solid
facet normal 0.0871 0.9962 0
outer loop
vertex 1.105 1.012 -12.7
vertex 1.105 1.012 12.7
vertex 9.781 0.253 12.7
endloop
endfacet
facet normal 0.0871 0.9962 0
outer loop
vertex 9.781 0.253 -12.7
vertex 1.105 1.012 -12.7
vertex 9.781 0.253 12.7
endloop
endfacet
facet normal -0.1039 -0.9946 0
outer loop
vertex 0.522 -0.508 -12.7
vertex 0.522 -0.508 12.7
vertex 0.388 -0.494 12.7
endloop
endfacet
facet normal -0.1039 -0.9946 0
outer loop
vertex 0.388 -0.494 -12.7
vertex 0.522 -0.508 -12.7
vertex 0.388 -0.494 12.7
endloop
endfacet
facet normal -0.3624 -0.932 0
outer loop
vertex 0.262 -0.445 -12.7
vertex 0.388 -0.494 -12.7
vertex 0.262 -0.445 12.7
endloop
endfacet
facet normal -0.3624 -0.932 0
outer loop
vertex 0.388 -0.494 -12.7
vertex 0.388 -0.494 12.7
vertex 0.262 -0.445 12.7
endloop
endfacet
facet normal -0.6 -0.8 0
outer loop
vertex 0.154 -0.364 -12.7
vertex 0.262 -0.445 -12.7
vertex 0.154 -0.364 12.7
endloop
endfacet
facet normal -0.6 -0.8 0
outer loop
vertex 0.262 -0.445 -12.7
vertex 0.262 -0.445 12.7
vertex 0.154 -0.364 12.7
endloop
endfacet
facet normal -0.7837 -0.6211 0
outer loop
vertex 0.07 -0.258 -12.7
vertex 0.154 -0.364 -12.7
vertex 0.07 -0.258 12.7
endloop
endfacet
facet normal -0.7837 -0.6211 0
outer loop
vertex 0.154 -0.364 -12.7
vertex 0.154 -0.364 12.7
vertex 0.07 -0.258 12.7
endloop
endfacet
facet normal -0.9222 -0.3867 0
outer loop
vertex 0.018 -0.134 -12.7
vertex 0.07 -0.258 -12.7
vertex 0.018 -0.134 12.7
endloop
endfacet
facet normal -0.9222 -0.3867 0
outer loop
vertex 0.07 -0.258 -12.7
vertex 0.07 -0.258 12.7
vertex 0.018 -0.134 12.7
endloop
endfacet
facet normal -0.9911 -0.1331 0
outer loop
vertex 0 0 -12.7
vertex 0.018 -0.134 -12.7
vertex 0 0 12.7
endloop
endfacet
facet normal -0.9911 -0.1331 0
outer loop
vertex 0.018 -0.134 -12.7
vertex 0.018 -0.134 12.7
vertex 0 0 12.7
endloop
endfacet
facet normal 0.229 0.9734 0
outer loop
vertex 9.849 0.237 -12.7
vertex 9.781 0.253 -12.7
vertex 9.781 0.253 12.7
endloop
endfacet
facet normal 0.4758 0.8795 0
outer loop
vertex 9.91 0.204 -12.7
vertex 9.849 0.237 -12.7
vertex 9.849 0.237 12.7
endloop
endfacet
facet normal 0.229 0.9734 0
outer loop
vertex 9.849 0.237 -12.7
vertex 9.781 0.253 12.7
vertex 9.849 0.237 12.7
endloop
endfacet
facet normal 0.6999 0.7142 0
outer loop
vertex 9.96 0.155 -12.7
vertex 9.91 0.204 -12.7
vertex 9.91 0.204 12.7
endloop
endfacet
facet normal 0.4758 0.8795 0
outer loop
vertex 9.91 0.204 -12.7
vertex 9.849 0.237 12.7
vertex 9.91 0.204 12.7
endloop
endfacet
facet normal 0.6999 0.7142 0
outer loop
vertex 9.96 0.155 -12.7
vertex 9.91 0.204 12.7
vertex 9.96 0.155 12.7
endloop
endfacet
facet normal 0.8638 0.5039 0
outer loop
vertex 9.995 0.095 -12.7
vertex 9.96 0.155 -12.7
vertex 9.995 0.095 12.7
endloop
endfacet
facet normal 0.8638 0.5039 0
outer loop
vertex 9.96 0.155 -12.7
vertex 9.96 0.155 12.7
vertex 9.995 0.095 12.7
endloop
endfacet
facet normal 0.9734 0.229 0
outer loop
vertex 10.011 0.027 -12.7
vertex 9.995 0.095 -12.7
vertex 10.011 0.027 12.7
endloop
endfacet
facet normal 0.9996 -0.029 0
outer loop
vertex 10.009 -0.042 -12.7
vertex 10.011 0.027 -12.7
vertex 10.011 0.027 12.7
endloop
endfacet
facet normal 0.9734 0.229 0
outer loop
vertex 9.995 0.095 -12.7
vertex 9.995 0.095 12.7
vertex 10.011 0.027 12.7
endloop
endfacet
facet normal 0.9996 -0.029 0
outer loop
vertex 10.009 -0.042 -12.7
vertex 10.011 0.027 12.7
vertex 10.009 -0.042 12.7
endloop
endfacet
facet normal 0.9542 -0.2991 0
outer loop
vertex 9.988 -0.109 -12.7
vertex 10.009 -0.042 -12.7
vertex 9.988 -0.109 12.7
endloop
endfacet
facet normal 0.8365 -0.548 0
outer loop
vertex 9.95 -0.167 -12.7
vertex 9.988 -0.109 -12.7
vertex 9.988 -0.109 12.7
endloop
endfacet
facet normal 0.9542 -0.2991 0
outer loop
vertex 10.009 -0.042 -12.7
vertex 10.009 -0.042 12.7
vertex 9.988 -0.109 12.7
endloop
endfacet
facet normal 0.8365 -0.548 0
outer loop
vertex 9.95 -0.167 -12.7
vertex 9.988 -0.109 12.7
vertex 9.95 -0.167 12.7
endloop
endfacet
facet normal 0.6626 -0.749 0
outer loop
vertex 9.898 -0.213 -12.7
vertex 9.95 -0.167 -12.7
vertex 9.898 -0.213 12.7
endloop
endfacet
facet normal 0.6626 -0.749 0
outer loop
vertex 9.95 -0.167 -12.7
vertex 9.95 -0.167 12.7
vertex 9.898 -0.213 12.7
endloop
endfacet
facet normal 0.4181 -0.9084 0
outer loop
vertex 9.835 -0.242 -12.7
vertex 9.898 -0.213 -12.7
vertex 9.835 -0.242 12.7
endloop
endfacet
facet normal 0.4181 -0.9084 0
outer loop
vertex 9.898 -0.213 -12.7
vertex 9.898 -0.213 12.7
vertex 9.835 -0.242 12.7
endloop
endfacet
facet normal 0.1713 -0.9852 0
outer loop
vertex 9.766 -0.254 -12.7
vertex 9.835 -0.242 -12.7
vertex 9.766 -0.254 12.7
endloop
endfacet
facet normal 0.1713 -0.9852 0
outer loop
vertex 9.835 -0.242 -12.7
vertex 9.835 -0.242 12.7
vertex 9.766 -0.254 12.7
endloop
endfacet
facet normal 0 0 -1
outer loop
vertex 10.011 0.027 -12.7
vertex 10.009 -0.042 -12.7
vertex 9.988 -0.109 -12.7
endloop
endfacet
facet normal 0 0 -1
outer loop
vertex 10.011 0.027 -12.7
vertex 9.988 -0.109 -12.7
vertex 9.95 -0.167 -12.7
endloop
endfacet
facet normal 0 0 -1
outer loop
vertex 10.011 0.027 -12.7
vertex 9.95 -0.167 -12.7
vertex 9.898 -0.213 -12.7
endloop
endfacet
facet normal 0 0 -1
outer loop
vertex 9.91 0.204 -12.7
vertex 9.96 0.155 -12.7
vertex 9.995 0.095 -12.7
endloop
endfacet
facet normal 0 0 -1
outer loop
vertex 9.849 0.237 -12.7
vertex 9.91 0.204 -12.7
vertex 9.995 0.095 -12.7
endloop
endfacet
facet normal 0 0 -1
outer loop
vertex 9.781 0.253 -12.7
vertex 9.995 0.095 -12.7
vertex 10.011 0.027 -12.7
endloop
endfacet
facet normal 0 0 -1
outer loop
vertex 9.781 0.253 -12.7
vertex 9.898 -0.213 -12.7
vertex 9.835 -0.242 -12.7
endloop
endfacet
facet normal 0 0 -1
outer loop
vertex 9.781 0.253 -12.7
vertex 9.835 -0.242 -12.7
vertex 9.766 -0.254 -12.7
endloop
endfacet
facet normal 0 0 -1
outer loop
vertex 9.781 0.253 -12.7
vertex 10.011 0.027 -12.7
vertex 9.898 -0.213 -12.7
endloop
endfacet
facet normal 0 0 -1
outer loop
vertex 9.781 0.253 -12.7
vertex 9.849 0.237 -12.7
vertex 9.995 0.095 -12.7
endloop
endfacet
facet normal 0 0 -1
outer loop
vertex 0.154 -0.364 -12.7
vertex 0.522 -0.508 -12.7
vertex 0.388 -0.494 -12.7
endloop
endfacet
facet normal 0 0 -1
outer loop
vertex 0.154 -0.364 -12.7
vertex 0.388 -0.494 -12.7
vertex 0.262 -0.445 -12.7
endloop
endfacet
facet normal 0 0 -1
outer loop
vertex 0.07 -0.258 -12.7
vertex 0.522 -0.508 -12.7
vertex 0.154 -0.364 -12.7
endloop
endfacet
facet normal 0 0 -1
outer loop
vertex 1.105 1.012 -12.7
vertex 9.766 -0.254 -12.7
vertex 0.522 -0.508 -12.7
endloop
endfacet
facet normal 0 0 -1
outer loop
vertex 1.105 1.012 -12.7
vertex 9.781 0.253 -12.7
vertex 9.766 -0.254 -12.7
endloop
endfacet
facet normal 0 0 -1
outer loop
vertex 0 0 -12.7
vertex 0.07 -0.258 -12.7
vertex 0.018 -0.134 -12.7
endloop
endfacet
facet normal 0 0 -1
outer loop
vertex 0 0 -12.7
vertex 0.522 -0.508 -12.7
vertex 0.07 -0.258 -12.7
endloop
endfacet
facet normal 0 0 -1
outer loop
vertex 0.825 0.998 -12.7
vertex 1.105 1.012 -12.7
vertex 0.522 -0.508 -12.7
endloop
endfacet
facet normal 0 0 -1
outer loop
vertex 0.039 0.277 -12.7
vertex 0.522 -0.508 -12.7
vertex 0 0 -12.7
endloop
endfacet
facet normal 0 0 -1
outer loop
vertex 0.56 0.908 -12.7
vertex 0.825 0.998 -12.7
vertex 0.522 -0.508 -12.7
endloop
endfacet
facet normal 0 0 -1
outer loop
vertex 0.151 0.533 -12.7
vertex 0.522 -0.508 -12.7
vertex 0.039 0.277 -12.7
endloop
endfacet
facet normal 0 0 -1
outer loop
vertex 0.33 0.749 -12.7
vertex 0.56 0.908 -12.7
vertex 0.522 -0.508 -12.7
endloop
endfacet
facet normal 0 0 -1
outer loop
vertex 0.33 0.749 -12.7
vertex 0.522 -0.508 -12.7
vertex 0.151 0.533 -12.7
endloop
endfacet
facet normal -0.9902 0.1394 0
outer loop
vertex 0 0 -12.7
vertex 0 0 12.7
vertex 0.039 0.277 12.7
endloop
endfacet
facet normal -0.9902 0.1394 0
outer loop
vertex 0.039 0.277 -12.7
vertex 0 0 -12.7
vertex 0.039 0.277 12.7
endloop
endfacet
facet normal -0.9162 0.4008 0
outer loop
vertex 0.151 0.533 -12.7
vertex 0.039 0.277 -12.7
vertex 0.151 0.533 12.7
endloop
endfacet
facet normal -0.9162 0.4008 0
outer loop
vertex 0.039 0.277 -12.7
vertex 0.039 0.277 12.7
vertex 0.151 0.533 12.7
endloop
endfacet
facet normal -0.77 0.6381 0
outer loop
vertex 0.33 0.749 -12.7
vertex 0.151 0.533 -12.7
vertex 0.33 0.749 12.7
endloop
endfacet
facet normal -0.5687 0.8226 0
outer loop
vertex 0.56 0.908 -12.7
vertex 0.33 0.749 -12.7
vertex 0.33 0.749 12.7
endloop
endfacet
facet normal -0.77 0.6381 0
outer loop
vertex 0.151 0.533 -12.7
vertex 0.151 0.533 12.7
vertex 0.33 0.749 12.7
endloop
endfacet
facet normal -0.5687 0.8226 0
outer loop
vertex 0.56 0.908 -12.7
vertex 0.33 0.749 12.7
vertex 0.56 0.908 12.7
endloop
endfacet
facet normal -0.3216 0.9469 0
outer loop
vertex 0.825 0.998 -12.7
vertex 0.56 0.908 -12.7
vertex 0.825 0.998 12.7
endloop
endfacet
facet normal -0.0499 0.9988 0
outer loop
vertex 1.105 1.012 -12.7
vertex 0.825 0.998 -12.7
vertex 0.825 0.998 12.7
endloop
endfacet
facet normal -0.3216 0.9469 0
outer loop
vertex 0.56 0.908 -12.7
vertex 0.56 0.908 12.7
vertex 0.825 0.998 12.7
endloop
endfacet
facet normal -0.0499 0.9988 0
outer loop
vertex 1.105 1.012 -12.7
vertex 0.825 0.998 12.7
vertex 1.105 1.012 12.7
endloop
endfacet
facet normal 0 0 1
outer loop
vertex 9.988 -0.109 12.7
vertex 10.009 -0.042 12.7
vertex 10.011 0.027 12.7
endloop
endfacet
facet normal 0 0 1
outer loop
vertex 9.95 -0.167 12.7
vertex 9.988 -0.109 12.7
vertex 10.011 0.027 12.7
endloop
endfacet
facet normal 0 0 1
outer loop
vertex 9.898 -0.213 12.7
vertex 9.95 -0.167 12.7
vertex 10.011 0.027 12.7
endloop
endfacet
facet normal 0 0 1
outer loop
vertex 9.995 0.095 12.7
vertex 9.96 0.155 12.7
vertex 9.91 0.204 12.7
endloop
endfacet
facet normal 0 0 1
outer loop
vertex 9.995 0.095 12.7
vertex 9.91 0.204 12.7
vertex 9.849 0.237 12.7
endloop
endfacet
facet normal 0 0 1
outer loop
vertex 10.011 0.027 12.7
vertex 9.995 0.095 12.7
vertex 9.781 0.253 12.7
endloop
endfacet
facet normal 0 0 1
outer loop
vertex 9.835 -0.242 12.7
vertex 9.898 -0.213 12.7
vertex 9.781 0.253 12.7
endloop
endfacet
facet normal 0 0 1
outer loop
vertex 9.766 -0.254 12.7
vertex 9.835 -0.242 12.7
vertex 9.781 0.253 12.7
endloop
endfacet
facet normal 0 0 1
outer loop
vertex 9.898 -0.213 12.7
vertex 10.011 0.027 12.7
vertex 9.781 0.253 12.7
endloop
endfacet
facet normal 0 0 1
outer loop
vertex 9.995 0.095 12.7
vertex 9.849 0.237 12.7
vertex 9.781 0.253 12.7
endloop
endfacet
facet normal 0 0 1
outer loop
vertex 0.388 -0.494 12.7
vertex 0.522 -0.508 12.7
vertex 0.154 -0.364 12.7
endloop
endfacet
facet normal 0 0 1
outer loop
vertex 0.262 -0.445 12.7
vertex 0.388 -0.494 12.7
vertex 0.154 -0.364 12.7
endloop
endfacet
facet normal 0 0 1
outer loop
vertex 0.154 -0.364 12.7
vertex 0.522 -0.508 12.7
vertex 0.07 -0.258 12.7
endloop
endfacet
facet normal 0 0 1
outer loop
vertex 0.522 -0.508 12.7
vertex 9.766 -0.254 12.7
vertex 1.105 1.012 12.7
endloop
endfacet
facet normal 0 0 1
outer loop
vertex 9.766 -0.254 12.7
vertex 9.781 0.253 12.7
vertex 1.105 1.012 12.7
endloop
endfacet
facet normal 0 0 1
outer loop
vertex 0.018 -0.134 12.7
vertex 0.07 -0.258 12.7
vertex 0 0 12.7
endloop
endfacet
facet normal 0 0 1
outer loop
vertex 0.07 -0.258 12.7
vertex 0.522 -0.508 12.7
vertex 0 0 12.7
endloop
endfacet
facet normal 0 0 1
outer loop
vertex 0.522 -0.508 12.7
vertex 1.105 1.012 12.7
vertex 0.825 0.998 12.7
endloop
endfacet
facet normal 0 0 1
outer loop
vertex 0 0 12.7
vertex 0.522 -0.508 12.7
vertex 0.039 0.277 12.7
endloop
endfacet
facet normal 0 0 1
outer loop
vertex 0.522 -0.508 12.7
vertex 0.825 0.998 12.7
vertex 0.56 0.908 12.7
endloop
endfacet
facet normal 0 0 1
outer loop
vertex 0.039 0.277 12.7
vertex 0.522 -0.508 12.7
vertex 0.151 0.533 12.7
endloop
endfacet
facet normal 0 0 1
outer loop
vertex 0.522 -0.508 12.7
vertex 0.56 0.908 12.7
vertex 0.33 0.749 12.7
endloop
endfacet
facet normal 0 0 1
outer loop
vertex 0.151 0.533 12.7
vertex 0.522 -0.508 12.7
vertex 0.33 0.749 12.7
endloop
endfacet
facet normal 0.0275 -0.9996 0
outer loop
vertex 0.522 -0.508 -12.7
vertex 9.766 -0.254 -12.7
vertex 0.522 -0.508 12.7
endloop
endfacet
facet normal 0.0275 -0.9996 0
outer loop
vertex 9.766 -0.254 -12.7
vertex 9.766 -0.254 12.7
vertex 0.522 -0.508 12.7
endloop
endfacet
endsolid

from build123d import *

# Parameters (mm, degrees)
BOSS_EXTRUDE1_DEPTH = 12.7


with BuildPart() as part:
    # Sketch1 → Boss-Extrude1 (new, symmetric)
    with BuildSketch(Plane.XY):
        with BuildLine():
            Line((1.104550235, 1.012133813), (9.781107052, 0.253033453))
            ThreePointArc((9.781107052, 0.253033453), (10.012855938, -0.007594285), (9.765943465, -0.253904241))
            Line((9.765943465, -0.253904241), (0.521947944, -0.507808482))
            ThreePointArc((0.521947944, -0.507808482), (0.15375542, -0.364108195), (0, 0))
            ThreePointArc((0, 0), (0.329600349, 0.749073774), (1.104550235, 1.012133813))
        make_face()
    extrude(amount=BOSS_EXTRUDE1_DEPTH, both=True)


solid = part.part
